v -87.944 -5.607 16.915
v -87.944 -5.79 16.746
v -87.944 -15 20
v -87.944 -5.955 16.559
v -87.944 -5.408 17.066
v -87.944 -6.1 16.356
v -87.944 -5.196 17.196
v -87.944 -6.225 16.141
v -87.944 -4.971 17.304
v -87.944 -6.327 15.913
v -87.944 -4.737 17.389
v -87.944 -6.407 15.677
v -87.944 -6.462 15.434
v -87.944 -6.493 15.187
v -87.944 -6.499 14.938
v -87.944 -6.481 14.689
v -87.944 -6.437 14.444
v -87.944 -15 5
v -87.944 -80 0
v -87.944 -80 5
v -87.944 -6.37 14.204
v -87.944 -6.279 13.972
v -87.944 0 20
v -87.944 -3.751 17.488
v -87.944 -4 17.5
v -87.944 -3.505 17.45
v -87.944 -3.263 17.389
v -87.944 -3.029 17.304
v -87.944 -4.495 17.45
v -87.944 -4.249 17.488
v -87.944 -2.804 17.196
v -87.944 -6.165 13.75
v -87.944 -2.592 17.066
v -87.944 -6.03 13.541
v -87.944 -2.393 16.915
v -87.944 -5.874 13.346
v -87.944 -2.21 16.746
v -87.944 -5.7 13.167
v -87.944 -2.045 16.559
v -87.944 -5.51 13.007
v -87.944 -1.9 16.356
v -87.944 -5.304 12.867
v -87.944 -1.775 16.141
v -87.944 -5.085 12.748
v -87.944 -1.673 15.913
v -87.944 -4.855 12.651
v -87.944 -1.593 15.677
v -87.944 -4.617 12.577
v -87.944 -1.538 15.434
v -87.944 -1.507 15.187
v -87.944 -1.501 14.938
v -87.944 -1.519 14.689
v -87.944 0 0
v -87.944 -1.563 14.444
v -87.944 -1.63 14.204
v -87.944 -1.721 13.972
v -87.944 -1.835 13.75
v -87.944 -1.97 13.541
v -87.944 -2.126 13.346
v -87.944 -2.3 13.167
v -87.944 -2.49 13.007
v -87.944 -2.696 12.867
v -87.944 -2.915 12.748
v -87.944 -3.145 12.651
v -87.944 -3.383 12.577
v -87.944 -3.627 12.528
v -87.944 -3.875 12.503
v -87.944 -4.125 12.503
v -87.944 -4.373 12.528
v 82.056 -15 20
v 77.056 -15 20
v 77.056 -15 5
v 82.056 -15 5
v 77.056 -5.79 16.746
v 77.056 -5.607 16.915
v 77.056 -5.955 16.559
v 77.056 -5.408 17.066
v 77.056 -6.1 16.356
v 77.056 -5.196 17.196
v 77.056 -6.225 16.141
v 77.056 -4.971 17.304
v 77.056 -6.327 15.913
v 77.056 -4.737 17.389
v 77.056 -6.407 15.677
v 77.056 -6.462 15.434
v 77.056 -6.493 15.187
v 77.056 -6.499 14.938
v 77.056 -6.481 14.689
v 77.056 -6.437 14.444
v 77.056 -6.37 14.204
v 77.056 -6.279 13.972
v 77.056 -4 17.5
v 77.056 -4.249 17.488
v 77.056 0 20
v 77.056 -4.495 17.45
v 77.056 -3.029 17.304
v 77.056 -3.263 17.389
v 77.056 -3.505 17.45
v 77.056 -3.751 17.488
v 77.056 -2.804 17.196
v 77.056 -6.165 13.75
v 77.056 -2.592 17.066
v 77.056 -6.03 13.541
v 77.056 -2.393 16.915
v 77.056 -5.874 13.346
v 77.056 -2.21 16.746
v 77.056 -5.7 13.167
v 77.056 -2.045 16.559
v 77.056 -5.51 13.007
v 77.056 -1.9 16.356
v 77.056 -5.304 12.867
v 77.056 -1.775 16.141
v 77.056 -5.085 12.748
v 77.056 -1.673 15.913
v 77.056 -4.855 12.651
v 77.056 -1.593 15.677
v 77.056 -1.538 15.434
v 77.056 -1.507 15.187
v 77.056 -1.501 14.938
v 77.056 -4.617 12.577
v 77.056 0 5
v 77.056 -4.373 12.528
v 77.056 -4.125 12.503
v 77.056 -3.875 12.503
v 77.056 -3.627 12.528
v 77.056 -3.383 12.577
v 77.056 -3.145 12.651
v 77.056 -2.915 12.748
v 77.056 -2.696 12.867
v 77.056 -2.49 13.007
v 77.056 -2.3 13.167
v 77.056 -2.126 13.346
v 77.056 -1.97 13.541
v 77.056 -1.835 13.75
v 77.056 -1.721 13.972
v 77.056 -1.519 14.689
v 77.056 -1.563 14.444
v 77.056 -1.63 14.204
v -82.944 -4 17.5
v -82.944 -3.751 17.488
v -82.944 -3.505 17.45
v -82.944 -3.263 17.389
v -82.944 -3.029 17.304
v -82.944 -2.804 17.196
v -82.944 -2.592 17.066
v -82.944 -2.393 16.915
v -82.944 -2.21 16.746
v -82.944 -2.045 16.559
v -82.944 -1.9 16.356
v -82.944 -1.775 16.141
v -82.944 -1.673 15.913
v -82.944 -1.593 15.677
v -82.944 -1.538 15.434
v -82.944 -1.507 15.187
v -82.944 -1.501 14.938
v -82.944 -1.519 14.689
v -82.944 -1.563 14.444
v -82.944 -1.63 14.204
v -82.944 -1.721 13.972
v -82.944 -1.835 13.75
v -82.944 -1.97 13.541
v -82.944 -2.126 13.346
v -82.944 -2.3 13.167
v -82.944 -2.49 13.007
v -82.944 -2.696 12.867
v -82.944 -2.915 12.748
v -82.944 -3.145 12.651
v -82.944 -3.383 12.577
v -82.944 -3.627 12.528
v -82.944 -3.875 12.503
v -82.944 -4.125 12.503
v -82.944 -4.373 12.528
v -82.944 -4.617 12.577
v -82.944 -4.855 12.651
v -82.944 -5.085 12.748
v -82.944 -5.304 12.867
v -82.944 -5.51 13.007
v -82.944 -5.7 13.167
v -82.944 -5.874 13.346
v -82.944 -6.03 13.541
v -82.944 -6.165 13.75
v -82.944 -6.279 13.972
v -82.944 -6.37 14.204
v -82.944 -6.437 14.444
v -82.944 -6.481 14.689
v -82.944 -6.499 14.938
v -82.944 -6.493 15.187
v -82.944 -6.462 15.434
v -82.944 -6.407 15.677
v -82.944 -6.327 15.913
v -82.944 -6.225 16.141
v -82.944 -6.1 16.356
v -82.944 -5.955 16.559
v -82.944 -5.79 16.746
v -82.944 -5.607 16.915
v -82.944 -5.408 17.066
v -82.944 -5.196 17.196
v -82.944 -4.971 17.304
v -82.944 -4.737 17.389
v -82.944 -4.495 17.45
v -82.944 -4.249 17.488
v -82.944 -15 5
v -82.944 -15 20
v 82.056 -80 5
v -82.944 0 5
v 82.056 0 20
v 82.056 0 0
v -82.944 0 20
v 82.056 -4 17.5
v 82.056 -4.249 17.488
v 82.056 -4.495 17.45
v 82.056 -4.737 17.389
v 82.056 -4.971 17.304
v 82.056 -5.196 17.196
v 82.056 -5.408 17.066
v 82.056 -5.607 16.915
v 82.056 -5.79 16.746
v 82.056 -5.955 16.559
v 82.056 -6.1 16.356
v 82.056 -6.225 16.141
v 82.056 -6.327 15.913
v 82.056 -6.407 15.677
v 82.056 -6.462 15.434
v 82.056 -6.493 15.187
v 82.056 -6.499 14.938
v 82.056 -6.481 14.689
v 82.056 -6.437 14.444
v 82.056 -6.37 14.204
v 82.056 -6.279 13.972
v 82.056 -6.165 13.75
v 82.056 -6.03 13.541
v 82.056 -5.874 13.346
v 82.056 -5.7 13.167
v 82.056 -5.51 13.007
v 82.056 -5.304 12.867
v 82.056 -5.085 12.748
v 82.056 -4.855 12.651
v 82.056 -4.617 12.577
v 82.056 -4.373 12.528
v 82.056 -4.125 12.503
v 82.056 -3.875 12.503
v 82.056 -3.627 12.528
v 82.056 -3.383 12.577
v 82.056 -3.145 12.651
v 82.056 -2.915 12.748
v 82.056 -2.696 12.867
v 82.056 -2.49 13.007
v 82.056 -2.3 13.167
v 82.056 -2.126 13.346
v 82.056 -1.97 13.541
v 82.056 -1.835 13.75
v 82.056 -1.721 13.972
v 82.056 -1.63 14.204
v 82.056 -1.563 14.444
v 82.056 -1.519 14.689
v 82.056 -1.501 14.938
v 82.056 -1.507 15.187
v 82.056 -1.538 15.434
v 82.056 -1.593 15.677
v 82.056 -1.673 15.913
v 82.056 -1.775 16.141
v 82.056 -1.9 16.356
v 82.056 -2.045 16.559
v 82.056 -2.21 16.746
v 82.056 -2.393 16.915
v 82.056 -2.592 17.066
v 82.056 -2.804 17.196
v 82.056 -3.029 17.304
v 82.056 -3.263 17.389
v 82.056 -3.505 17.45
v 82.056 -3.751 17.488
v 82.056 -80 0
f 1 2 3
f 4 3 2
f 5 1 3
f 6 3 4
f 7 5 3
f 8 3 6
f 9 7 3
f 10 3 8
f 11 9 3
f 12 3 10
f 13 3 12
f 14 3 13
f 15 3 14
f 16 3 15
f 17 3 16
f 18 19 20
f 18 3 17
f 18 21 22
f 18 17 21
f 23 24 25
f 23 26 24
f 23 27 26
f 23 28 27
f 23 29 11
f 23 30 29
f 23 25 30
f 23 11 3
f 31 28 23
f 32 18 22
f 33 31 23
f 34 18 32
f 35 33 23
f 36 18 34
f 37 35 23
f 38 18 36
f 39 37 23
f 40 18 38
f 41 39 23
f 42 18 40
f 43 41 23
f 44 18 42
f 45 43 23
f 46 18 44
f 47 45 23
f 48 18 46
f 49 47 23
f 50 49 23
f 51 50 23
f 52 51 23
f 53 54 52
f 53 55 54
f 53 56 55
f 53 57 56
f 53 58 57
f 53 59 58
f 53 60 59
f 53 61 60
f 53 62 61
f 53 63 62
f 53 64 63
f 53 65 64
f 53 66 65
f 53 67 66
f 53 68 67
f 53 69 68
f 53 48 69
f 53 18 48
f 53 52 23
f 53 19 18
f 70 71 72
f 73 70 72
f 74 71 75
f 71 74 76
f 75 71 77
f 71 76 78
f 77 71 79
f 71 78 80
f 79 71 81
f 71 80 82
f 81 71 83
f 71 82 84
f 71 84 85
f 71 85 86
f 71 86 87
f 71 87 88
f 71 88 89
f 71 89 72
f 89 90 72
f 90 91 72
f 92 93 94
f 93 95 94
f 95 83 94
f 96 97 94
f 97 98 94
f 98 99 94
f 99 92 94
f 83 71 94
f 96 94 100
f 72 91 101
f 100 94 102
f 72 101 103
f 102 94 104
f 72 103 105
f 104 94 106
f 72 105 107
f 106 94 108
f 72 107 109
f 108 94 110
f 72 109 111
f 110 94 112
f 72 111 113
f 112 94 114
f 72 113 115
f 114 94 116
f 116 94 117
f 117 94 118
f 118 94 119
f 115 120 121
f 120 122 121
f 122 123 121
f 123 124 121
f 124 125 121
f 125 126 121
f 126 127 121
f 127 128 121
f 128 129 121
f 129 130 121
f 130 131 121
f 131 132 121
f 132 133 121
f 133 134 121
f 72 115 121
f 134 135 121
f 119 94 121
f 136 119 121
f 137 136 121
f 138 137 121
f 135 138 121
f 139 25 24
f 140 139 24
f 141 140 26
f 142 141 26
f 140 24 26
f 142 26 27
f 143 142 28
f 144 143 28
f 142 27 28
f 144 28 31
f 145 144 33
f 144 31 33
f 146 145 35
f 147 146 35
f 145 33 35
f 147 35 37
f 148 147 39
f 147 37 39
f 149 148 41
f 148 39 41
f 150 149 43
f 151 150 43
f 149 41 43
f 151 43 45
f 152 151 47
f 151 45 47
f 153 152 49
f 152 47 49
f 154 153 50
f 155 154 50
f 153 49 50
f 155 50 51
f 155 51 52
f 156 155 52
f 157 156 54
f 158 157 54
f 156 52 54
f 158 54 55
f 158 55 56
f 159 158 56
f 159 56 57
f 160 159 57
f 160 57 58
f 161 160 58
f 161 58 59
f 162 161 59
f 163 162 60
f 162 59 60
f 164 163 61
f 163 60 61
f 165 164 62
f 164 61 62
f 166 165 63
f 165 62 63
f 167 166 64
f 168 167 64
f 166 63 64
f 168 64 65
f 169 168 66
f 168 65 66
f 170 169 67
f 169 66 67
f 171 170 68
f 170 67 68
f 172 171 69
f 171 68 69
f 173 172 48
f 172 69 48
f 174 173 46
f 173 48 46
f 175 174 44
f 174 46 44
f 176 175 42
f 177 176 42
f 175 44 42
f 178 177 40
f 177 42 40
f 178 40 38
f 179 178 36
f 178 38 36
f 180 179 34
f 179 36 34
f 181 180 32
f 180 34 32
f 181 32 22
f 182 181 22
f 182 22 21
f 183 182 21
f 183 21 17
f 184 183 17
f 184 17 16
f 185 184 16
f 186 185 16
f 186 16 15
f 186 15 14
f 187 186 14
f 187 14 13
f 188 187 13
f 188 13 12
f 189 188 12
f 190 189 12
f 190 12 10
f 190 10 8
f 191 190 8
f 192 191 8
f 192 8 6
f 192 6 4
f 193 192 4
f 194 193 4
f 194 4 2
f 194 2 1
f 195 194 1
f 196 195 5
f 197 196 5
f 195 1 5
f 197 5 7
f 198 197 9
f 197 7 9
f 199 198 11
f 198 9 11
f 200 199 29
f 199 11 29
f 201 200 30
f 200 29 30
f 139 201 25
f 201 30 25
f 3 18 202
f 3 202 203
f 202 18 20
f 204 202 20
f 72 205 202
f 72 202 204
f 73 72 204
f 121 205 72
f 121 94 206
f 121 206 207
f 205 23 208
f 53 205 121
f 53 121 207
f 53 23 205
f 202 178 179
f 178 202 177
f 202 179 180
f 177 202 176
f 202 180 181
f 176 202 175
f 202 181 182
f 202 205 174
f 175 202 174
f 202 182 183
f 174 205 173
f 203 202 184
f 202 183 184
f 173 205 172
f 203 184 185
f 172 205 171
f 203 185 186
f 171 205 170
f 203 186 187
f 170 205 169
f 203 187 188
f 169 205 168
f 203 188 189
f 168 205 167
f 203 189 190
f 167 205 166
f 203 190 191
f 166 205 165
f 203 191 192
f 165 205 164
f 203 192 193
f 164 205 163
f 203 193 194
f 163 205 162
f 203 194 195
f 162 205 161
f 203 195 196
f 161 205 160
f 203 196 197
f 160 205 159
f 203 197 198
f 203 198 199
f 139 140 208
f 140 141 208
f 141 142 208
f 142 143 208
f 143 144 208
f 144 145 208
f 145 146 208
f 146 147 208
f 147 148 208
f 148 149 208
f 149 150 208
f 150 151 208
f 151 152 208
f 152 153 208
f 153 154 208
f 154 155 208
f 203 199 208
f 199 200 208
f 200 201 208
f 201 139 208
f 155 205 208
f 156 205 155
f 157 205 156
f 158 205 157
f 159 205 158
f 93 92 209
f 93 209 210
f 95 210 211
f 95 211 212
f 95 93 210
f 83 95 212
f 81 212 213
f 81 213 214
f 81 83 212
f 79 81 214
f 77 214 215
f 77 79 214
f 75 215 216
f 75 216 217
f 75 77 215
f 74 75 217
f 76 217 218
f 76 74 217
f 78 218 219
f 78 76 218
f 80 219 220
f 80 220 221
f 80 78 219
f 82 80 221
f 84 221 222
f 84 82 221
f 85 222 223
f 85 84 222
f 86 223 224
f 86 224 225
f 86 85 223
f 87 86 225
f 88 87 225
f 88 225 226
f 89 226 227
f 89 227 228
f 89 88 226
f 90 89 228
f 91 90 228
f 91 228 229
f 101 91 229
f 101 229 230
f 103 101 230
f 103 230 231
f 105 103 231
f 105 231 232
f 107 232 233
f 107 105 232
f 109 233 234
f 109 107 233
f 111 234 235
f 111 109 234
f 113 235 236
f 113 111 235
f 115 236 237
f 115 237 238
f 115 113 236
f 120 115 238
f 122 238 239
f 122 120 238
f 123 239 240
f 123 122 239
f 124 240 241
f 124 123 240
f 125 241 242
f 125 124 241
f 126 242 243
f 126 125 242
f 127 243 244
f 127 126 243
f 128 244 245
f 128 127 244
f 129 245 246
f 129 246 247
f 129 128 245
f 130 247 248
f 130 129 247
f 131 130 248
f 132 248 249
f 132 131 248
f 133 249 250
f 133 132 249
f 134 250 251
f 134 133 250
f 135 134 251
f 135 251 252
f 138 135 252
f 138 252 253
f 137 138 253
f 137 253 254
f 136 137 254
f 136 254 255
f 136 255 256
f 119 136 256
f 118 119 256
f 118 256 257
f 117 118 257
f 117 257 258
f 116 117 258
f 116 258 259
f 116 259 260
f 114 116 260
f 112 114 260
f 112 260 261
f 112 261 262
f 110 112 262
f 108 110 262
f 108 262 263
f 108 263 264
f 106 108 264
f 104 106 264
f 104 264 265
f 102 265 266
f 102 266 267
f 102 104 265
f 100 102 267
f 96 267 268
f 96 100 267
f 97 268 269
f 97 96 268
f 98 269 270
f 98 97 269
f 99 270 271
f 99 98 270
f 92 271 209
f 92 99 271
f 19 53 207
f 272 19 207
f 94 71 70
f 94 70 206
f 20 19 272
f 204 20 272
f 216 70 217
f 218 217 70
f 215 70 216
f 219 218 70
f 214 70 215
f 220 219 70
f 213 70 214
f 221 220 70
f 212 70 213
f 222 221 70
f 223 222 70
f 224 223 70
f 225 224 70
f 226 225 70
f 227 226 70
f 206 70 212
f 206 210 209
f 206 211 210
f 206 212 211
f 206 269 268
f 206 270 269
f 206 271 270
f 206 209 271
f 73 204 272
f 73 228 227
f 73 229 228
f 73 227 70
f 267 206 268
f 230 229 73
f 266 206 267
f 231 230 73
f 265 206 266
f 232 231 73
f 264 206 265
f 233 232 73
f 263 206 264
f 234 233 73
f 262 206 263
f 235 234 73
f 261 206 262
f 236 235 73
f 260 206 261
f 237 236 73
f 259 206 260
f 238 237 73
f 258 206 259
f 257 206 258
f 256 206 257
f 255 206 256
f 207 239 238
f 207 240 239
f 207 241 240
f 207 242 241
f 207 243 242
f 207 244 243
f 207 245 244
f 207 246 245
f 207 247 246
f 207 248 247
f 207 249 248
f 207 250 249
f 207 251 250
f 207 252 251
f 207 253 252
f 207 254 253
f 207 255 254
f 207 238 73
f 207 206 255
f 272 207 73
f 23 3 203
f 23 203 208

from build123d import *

# Parameters (mm, degrees)
SKETCH_1_W      = 170
SKETCH_1_H      = 80
EXTRUDE_1_DEPTH = 5
SKETCH_2_W      = 20
SKETCH_2_H      = 15
SKETCH_2_R      = 2.5
EXTRUDE_2_DEPTH = 5
EXTRUDE_START   = -5
SKETCH_3_W      = 20
SKETCH_3_H      = 15
SKETCH_3_R      = 2.5
EXTRUDE_3_DEPTH = 5


with BuildPart() as part:
    # 草图1 → 凸台-拉伸1 (new body)
    with BuildSketch(Plane.XY):
        with Locations((-2.943722944, -40)):
            Rectangle(SKETCH_1_W, SKETCH_1_H)
    extrude(amount=EXTRUDE_1_DEPTH)

    # 草图2 → 凸台-拉伸2 (add)
    with BuildSketch(Plane.ZY.offset(87.943722944)):
        with Locations((10, -7.5)):
            Rectangle(SKETCH_2_W, SKETCH_2_H)
        with Locations((15, -4)):
            Circle(SKETCH_2_R, mode=Mode.SUBTRACT)
    extrude(amount=-EXTRUDE_2_DEPTH)

    # 草图3 → 凸台-拉伸3 (add)
    with BuildSketch(Plane(origin=(82.056277056, 0, 0), x_dir=(0, 0, -1), z_dir=(1, 0, 0)).offset(EXTRUDE_START)):
        with Locations((-10, -7.5)):
            Rectangle(SKETCH_3_W, SKETCH_3_H)
        with Locations(Location((-15, -4, 0), (0, 0, 180))):
            Circle(SKETCH_3_R, mode=Mode.SUBTRACT)
    extrude(amount=EXTRUDE_3_DEPTH)


solid = part.part
